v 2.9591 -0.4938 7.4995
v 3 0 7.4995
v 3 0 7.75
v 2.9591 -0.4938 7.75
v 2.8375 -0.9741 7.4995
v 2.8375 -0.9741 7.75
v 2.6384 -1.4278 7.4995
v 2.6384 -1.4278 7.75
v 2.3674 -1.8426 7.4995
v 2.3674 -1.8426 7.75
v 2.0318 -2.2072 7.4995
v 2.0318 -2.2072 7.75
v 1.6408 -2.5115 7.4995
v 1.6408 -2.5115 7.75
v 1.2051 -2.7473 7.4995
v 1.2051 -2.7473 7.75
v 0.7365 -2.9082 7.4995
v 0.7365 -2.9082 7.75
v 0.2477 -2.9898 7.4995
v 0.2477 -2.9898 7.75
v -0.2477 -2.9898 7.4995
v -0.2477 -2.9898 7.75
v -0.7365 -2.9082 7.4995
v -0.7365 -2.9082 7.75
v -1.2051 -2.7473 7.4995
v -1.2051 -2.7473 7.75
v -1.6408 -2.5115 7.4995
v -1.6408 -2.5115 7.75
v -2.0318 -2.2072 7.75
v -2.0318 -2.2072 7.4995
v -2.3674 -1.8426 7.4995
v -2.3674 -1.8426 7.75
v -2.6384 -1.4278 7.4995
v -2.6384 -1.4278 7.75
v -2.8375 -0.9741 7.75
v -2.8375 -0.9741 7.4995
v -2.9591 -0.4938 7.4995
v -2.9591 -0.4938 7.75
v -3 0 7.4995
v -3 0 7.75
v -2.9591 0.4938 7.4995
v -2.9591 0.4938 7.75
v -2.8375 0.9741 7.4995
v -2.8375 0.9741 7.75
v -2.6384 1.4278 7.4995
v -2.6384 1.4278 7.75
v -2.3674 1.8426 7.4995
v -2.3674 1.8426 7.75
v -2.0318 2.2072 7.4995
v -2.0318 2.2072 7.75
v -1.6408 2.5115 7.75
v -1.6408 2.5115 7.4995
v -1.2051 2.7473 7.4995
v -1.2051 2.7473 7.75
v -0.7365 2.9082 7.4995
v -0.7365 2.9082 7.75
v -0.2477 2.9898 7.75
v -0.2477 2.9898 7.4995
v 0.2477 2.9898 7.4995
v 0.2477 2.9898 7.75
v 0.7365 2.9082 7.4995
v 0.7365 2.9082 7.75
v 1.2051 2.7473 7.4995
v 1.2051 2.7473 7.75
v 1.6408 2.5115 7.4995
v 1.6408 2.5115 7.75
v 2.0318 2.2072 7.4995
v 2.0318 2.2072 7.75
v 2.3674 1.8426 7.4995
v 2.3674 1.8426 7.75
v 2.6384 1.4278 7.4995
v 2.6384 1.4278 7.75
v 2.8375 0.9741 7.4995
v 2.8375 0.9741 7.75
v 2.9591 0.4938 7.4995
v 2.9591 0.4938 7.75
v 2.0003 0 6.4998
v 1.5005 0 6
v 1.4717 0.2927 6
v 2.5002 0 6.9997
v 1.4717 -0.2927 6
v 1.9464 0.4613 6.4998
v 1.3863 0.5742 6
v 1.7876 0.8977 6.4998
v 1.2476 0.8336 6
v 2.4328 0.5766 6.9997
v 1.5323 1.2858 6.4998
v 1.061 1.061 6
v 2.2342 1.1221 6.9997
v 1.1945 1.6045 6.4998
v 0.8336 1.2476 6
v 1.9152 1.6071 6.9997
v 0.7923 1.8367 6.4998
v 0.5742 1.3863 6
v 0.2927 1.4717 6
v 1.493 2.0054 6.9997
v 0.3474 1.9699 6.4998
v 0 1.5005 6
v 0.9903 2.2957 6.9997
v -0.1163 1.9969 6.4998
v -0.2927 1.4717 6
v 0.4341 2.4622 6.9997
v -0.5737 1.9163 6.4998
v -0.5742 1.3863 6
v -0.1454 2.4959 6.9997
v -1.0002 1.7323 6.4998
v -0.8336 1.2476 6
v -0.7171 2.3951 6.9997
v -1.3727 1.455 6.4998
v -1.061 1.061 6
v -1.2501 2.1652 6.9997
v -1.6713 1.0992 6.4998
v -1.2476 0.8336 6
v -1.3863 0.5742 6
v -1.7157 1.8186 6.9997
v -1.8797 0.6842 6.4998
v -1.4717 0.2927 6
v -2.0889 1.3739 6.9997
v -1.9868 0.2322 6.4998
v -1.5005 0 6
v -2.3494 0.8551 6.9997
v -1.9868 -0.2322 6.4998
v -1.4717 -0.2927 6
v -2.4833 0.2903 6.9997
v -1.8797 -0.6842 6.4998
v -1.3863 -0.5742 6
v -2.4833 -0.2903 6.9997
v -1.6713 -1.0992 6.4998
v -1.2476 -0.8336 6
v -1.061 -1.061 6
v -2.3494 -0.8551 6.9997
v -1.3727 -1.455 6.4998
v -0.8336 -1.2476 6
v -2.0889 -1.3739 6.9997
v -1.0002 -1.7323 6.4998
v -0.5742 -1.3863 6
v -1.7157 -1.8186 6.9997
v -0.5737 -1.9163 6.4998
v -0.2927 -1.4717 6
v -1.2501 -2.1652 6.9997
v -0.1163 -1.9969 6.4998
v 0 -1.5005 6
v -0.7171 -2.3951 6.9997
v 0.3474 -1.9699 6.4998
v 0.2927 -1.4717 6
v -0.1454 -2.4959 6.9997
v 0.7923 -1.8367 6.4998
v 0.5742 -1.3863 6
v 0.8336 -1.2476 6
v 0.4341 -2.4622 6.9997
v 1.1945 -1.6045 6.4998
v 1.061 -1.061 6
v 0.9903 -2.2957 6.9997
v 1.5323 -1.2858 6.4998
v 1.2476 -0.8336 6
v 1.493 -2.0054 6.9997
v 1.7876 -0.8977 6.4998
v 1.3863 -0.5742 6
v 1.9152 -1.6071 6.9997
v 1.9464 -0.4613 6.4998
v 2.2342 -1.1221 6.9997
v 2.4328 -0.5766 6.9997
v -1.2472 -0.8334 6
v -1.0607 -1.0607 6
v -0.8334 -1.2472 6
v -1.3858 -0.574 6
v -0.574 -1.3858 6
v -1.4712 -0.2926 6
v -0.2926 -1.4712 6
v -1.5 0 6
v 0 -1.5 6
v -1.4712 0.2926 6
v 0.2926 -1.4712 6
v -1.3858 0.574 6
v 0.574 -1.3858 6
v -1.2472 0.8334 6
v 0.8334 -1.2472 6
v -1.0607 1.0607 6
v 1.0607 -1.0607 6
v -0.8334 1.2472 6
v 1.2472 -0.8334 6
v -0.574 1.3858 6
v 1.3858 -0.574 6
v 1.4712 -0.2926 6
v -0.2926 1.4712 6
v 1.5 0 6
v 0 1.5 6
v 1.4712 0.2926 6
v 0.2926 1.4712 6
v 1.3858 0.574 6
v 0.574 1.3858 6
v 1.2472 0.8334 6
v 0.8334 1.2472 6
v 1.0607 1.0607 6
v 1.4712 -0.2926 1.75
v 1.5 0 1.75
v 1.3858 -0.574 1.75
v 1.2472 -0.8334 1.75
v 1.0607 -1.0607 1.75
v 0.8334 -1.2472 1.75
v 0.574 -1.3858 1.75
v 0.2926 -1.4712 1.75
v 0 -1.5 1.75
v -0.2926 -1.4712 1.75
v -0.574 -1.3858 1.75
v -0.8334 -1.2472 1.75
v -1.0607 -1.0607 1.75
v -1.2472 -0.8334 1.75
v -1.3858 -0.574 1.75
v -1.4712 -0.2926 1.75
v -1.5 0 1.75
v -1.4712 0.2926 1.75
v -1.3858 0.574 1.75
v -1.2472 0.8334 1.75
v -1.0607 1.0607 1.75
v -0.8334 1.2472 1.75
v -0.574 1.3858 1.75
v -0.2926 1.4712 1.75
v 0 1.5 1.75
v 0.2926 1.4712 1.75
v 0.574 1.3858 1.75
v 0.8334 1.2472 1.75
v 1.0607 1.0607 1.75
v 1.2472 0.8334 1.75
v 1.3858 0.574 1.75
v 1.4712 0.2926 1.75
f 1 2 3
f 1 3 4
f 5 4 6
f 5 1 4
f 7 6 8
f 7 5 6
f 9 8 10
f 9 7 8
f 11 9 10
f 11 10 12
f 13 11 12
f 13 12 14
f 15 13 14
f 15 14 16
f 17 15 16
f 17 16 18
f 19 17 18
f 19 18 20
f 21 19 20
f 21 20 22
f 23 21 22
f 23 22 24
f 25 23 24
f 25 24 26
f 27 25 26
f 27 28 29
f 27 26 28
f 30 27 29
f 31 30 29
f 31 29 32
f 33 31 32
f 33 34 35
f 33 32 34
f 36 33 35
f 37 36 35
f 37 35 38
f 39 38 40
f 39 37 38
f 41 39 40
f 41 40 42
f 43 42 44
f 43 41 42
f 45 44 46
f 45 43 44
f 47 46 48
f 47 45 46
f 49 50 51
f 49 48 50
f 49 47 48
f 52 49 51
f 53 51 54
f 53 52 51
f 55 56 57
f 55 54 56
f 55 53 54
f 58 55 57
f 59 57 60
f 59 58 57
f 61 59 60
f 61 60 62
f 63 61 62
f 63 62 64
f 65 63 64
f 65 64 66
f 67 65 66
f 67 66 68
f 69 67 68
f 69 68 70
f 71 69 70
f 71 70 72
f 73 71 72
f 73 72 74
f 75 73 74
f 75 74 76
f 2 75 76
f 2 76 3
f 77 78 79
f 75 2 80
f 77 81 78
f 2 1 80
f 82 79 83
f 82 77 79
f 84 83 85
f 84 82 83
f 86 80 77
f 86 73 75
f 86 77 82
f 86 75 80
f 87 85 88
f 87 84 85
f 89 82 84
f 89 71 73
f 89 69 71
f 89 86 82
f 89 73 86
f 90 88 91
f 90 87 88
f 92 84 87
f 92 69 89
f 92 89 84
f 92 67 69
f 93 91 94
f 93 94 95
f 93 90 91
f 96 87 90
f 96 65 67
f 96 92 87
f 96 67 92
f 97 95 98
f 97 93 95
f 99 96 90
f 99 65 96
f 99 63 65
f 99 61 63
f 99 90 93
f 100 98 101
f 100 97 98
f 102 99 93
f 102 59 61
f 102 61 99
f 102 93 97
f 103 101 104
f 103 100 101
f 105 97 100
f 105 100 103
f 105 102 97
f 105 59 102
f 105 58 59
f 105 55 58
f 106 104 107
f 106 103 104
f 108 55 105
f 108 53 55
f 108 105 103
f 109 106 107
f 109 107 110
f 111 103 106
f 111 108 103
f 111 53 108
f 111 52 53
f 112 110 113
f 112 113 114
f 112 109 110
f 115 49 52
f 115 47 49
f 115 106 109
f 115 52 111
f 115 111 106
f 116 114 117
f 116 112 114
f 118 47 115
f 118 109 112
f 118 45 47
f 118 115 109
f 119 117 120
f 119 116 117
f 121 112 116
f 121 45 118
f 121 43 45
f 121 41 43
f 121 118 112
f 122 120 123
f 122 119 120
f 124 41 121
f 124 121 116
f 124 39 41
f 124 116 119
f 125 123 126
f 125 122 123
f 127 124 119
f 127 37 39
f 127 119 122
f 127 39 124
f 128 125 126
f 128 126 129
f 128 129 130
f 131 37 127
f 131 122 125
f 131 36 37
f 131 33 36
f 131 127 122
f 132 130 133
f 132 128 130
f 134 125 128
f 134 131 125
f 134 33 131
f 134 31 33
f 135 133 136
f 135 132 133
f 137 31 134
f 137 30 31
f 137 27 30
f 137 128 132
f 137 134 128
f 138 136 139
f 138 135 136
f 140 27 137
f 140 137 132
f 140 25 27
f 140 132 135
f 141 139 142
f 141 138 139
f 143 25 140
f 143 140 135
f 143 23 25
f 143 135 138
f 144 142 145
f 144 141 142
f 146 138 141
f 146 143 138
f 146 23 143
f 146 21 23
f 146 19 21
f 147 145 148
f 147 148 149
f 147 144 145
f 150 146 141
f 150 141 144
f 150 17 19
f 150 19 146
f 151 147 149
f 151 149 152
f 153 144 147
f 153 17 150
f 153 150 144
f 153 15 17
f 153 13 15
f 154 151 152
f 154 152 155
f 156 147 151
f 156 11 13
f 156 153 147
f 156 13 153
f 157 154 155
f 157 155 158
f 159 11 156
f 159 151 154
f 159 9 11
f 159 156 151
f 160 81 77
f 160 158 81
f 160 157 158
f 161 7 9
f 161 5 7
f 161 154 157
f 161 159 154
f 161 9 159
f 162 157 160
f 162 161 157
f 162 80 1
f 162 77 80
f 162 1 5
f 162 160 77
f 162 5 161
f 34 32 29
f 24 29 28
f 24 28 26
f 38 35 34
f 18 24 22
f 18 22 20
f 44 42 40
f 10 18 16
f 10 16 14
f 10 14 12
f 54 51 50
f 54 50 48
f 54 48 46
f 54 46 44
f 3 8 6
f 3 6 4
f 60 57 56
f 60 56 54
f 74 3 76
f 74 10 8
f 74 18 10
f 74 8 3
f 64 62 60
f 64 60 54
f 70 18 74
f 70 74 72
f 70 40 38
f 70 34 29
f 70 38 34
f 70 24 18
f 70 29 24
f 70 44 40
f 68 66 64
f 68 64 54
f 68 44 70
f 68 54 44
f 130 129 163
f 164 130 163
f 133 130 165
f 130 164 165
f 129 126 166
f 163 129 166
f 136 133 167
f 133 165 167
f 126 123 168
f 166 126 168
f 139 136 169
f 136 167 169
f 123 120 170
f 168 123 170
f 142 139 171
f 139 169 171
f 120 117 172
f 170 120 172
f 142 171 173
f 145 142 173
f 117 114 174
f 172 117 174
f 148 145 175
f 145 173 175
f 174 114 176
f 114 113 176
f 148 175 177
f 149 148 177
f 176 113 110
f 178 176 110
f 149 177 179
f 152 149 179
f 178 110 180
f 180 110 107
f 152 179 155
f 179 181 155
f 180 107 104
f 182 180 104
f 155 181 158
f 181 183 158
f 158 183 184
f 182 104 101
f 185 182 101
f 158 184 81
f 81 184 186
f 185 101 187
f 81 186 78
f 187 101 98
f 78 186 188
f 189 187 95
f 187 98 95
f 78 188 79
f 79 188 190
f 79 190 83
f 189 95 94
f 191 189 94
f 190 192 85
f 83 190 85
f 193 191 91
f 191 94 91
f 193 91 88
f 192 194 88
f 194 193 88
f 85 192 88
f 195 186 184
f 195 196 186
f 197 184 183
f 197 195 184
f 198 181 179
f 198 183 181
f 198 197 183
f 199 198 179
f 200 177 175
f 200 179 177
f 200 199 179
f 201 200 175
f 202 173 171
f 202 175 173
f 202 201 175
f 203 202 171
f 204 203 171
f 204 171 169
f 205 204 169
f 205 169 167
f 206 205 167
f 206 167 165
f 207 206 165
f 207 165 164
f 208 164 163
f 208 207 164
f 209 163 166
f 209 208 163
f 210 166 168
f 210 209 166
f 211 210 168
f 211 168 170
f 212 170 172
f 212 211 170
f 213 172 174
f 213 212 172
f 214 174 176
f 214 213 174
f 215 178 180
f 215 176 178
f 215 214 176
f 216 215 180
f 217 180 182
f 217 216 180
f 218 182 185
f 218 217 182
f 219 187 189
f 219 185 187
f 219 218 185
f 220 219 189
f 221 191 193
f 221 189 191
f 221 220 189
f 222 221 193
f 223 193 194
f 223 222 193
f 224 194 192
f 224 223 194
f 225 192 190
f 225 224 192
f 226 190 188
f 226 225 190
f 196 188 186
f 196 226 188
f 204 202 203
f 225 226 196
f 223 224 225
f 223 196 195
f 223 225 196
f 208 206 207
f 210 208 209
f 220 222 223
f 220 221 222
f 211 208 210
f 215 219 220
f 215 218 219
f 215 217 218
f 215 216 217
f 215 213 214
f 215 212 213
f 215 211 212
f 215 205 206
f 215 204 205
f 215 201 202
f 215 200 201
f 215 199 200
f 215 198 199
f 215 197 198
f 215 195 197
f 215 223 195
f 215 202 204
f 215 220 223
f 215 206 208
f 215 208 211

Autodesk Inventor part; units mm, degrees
ref_plane "YZ Plane" through (0, 0, 0) normal (1, 0, 0) x (0, 1, 0)
ref_plane "XZ Plane" through (0, 0, 0) normal (0, 1, 0) x (-1, 0, 0)
ref_plane "XY Plane" through (0, 0, 0) normal (0, 0, 1) x (1, 0, 0)
sketch "スケッチ1" plane through (0, 0, 0) normal (0, 0, 1) x (1, 0, 0)
  circle A0 centre (0, 0) radius 1.5
  dimension "d0" = 3
extrude "押し出し1" add sketch "スケッチ1" along normal blind 6
sketch "スケッチ2" plane through (0, 0, 6) normal (0, 0, 1) x (1, 0, 0)
  circle A0 centre (0, 0) radius 1.5 projected
  circle A1 centre (0, 0) radius 3
  dimension "d3" = 6
extrude "押し出し2" add sketch "スケッチ2" along normal blind 1.75 contours A0 | A1
thread "ねじ1" size "M3x0.5" class "6g" standard "ANSI Metric M Profile" full length
chamfer "面取り1" distance 1.5 angle 45 1 edges at (-3, 0, 6)
sketch "スケッチ4" plane through (0, 0, 0) normal (0, 0, -1) x (-1, 0, 0)
  circle A0 centre (0, 0) radius 1.5 projected
extrude "押し出し4" cut sketch "スケッチ4" against normal blind 1.75
properties part number "SB　6mm皿ネジ" material "Steel, Mild"
